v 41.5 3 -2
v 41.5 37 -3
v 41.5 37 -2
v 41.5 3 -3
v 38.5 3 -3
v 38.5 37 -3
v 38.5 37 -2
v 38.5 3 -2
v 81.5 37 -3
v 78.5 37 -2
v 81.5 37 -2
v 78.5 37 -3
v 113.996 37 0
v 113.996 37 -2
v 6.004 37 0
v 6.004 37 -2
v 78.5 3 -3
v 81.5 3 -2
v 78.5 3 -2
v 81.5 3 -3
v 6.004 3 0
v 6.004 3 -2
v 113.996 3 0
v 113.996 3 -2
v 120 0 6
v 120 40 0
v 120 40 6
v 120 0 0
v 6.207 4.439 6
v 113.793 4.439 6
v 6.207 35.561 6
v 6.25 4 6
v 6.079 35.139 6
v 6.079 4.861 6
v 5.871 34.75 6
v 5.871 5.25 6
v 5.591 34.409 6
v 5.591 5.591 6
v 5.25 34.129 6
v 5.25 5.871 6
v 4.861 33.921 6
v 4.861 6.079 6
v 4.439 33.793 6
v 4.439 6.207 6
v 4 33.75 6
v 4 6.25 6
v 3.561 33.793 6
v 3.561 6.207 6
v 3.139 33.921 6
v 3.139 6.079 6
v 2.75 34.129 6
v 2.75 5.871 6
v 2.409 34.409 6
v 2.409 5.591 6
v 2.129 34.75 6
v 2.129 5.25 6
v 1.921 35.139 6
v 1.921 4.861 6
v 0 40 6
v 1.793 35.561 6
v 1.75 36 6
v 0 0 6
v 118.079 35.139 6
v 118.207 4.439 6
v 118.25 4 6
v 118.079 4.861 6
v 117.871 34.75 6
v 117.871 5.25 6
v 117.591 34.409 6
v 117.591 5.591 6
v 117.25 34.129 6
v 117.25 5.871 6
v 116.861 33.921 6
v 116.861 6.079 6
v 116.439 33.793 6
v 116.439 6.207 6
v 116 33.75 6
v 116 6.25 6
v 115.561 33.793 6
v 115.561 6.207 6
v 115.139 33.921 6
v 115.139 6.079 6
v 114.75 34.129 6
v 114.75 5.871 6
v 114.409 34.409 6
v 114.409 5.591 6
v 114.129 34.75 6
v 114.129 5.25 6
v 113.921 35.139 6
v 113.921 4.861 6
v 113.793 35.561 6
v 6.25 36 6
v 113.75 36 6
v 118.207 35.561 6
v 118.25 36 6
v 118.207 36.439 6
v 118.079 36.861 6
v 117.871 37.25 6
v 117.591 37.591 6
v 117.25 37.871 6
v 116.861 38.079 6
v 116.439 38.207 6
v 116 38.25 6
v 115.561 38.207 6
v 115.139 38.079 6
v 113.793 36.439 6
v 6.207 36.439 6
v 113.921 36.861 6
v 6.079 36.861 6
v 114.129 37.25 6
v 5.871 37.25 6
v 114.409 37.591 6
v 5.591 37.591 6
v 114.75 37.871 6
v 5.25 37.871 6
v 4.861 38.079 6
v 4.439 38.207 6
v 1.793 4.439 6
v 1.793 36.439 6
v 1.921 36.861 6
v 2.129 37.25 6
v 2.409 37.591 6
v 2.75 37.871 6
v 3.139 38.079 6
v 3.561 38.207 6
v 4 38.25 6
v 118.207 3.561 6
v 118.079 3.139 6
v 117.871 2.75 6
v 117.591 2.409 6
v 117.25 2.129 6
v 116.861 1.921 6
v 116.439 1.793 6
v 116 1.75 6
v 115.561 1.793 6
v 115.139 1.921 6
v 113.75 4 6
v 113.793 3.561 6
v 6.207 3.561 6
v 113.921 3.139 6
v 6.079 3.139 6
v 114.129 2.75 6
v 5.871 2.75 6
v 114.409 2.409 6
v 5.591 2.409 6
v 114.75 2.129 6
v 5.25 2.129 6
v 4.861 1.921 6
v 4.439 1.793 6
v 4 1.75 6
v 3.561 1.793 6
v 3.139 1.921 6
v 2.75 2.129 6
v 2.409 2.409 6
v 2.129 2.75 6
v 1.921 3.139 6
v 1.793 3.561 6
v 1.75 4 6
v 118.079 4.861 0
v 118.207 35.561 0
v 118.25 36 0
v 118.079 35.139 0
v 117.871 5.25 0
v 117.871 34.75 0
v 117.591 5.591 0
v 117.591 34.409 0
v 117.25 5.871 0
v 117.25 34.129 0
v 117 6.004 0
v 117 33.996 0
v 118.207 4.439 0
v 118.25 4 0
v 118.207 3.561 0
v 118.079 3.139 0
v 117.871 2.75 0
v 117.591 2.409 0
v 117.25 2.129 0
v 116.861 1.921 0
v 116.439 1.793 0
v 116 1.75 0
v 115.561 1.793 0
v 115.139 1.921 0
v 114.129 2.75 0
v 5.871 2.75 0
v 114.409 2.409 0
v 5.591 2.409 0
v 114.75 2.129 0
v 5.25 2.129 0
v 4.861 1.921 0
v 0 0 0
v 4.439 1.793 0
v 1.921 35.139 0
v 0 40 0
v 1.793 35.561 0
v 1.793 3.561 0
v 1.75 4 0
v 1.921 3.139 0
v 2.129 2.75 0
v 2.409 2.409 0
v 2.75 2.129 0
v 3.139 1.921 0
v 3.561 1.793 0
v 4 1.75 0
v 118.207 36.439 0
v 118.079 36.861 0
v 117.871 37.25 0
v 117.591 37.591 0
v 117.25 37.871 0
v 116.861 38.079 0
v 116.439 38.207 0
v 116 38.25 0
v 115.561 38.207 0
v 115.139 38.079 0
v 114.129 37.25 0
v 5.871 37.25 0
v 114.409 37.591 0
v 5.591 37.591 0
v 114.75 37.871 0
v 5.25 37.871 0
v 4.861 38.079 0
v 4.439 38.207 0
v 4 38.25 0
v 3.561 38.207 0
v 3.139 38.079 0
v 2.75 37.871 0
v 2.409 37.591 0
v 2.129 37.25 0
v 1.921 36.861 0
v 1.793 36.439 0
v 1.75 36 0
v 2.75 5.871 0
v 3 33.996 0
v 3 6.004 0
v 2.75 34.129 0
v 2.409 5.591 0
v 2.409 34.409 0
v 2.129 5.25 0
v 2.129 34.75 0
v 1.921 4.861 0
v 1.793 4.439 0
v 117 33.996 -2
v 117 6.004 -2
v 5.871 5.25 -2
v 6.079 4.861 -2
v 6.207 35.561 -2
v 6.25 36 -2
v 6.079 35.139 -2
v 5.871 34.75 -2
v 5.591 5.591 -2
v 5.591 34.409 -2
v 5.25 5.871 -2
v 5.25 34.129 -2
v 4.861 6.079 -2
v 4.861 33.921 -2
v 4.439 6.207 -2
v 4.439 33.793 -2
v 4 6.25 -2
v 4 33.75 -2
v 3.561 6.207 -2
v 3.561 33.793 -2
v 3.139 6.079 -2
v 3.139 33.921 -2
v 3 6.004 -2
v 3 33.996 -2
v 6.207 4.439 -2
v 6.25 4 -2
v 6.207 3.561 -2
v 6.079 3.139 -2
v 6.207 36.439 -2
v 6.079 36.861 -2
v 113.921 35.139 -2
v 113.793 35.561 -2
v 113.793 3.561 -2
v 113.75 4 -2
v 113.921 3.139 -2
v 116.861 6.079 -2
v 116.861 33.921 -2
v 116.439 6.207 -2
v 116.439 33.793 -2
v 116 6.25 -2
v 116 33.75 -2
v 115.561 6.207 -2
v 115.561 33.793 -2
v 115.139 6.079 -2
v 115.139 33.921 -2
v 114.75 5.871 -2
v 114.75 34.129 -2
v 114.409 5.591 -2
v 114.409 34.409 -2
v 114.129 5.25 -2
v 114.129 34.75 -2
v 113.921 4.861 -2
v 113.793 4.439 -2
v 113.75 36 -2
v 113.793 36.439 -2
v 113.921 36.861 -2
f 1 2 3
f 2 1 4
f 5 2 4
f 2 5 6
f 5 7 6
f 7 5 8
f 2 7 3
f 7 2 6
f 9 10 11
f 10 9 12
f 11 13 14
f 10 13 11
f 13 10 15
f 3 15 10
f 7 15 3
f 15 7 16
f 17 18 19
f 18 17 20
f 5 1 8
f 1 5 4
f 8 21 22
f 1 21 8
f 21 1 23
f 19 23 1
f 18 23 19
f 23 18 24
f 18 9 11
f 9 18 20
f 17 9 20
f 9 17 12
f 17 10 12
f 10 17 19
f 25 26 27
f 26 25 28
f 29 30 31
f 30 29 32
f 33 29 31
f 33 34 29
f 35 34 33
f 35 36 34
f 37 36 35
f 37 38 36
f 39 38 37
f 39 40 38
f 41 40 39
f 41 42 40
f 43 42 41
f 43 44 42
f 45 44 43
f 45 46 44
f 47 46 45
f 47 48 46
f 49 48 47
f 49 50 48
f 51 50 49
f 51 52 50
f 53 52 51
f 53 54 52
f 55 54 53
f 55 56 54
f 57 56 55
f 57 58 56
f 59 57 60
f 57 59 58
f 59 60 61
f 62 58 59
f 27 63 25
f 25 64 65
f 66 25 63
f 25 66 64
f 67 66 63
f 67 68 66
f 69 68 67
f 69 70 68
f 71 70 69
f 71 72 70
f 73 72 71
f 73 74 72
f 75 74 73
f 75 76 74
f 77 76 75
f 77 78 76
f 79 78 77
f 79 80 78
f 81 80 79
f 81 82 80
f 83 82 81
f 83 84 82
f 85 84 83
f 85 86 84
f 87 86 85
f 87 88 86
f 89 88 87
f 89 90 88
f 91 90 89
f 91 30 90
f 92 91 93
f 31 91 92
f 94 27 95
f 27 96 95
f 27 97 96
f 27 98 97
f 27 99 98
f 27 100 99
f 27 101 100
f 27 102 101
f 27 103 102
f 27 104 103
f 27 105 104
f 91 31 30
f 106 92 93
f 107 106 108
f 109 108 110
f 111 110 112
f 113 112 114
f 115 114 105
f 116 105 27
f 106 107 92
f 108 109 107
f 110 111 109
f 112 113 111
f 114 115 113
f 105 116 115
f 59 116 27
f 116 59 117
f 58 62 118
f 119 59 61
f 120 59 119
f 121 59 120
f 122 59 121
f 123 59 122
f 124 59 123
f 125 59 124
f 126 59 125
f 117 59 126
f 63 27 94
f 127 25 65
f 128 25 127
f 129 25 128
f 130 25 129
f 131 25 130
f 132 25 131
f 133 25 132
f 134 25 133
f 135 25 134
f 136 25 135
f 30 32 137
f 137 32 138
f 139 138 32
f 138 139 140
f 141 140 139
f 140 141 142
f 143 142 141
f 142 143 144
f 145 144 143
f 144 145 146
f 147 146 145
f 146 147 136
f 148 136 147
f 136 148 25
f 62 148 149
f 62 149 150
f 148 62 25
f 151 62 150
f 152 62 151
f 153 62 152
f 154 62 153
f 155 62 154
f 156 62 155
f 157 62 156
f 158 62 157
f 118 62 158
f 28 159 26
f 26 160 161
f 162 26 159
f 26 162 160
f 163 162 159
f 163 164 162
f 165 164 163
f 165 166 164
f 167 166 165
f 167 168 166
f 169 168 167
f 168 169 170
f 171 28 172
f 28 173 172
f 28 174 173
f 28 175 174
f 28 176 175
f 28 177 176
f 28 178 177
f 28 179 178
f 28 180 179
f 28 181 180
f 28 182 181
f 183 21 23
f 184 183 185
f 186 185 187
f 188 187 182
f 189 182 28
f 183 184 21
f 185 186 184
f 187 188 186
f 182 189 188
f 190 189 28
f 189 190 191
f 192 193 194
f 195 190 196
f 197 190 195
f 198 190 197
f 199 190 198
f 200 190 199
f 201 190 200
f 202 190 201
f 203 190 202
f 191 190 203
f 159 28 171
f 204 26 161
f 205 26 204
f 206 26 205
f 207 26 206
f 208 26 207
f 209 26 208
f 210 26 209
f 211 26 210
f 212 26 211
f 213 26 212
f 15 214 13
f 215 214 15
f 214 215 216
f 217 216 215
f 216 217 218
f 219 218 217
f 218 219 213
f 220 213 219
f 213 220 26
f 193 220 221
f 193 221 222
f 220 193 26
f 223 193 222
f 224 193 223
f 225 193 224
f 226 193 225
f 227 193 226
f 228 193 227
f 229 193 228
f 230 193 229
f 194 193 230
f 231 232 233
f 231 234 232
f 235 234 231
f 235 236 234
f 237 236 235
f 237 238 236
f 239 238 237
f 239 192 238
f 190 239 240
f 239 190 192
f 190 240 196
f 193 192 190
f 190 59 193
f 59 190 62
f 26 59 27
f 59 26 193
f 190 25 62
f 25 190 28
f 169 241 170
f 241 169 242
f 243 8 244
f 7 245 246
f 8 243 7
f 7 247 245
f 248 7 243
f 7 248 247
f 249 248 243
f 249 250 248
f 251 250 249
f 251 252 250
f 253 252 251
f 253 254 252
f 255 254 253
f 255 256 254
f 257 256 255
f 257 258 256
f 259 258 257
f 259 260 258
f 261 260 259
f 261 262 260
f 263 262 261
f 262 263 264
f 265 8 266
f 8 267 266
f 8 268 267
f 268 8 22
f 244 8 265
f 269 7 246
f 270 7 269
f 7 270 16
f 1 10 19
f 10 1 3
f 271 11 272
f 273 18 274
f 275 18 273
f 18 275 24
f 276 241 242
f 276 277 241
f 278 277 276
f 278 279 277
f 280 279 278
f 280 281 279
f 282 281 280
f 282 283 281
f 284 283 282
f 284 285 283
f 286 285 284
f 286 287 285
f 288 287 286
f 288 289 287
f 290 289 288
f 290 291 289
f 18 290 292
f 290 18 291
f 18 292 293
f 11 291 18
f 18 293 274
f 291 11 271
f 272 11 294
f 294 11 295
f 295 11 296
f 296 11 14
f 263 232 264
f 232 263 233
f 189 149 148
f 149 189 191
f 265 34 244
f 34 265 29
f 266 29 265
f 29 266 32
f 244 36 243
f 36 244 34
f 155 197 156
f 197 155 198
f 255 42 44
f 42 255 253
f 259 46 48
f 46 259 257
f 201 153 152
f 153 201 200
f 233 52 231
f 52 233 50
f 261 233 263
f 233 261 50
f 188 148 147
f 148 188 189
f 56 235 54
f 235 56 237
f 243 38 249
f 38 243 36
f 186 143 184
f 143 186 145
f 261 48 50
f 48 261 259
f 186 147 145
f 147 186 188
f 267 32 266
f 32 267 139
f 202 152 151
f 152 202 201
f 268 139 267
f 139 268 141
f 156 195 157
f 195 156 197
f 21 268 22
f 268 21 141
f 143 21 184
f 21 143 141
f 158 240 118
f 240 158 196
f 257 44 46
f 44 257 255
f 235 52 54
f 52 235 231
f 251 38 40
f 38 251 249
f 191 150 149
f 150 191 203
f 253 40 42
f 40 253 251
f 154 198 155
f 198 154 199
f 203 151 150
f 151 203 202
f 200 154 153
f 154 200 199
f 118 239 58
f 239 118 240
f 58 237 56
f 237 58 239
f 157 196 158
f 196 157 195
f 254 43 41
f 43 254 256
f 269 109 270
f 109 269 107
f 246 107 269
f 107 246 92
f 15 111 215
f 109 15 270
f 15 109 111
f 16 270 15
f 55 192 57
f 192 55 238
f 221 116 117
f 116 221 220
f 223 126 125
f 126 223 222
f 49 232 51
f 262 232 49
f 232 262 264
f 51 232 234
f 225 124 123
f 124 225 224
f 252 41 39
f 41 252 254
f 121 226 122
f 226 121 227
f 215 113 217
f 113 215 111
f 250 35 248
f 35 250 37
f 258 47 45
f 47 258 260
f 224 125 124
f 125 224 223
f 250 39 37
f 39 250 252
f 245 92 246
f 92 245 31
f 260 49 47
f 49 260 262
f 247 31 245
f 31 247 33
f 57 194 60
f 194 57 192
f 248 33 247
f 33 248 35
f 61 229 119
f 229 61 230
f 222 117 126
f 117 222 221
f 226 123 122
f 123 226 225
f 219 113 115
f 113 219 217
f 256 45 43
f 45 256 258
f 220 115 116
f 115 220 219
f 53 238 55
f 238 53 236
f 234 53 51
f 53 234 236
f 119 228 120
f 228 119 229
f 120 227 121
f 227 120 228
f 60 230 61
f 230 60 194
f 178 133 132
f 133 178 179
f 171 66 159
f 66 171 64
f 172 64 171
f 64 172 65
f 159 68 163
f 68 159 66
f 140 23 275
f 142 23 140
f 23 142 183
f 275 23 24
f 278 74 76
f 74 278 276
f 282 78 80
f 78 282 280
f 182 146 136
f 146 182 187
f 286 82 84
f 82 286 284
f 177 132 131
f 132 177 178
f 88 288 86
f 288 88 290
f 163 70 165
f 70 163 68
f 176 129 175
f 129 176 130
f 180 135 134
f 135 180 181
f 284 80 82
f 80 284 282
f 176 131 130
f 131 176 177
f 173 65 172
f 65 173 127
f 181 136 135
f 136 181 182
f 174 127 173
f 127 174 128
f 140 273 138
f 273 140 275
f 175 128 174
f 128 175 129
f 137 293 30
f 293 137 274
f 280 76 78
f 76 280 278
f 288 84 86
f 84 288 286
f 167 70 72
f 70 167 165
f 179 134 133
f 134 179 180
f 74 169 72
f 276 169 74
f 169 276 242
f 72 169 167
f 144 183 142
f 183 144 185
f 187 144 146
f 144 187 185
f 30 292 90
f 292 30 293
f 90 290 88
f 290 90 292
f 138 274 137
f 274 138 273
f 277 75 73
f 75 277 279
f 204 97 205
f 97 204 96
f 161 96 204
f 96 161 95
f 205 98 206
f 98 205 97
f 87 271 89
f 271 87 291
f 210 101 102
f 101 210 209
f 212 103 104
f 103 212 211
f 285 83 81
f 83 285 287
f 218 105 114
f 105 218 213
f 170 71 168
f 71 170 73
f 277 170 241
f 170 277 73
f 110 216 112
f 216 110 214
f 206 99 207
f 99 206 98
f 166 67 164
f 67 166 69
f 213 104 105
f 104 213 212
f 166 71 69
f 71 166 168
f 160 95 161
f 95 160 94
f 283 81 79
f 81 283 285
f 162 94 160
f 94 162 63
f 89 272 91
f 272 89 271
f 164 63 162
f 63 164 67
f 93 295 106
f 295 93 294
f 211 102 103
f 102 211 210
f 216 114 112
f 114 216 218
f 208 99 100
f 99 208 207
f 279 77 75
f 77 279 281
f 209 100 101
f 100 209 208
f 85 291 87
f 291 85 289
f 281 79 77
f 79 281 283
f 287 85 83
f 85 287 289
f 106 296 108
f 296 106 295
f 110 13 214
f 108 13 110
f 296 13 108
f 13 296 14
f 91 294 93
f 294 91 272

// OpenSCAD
$fn = 32;

// ----------------------------------------------------------------------
// Enclosure lid: 120 x 40 x 6 mm, 4 bolt holes
// ----------------------------------------------------------------------

// --- parameters (mm) ---
length = 120;             // lid length, X
width = 40;               // lid width, Y
plate_t = 6;              // lid plate thickness
bolt_d = 4.5;             // bolt clearance
boss_lip = 4;             // bolt hole inset from the corner
sink = 1;                 // overlap of the lip and ribs into the plate
lip_h = 3;                // lip height below the plate
lip_wall = 3;             // lip wall thickness
rib_n = 2;                // stiffening ribs
rib_t = 3;                // rib thickness
rib_h = 4;                // rib height below the plate

module plate() {
  cube([length, width, plate_t]);
  /* lip that drops into the housing opening, sunk into the plate */
  translate([lip_wall, lip_wall, -lip_h + sink]) cube([length - 2 * lip_wall, width - 2 * lip_wall, lip_h]);
  /* stiffening ribs under the plate */
  for (i = [1 : rib_n]) translate([length * i / (rib_n + 1) - rib_t / 2, lip_wall, -rib_h + sink]) cube([rib_t, width - 2 * lip_wall, rib_h]);
}

difference() {
  plate();
  /* bolt pattern matching the corner bosses */
  for (sx = [0, 1]) for (sy = [0, 1])
    translate([sx * (length - 2 * boss_lip) + boss_lip, sy * (width - 2 * boss_lip) + boss_lip, -lip_h - 1])
      cylinder(h = plate_t + lip_h + 2, d = bolt_d);
}
